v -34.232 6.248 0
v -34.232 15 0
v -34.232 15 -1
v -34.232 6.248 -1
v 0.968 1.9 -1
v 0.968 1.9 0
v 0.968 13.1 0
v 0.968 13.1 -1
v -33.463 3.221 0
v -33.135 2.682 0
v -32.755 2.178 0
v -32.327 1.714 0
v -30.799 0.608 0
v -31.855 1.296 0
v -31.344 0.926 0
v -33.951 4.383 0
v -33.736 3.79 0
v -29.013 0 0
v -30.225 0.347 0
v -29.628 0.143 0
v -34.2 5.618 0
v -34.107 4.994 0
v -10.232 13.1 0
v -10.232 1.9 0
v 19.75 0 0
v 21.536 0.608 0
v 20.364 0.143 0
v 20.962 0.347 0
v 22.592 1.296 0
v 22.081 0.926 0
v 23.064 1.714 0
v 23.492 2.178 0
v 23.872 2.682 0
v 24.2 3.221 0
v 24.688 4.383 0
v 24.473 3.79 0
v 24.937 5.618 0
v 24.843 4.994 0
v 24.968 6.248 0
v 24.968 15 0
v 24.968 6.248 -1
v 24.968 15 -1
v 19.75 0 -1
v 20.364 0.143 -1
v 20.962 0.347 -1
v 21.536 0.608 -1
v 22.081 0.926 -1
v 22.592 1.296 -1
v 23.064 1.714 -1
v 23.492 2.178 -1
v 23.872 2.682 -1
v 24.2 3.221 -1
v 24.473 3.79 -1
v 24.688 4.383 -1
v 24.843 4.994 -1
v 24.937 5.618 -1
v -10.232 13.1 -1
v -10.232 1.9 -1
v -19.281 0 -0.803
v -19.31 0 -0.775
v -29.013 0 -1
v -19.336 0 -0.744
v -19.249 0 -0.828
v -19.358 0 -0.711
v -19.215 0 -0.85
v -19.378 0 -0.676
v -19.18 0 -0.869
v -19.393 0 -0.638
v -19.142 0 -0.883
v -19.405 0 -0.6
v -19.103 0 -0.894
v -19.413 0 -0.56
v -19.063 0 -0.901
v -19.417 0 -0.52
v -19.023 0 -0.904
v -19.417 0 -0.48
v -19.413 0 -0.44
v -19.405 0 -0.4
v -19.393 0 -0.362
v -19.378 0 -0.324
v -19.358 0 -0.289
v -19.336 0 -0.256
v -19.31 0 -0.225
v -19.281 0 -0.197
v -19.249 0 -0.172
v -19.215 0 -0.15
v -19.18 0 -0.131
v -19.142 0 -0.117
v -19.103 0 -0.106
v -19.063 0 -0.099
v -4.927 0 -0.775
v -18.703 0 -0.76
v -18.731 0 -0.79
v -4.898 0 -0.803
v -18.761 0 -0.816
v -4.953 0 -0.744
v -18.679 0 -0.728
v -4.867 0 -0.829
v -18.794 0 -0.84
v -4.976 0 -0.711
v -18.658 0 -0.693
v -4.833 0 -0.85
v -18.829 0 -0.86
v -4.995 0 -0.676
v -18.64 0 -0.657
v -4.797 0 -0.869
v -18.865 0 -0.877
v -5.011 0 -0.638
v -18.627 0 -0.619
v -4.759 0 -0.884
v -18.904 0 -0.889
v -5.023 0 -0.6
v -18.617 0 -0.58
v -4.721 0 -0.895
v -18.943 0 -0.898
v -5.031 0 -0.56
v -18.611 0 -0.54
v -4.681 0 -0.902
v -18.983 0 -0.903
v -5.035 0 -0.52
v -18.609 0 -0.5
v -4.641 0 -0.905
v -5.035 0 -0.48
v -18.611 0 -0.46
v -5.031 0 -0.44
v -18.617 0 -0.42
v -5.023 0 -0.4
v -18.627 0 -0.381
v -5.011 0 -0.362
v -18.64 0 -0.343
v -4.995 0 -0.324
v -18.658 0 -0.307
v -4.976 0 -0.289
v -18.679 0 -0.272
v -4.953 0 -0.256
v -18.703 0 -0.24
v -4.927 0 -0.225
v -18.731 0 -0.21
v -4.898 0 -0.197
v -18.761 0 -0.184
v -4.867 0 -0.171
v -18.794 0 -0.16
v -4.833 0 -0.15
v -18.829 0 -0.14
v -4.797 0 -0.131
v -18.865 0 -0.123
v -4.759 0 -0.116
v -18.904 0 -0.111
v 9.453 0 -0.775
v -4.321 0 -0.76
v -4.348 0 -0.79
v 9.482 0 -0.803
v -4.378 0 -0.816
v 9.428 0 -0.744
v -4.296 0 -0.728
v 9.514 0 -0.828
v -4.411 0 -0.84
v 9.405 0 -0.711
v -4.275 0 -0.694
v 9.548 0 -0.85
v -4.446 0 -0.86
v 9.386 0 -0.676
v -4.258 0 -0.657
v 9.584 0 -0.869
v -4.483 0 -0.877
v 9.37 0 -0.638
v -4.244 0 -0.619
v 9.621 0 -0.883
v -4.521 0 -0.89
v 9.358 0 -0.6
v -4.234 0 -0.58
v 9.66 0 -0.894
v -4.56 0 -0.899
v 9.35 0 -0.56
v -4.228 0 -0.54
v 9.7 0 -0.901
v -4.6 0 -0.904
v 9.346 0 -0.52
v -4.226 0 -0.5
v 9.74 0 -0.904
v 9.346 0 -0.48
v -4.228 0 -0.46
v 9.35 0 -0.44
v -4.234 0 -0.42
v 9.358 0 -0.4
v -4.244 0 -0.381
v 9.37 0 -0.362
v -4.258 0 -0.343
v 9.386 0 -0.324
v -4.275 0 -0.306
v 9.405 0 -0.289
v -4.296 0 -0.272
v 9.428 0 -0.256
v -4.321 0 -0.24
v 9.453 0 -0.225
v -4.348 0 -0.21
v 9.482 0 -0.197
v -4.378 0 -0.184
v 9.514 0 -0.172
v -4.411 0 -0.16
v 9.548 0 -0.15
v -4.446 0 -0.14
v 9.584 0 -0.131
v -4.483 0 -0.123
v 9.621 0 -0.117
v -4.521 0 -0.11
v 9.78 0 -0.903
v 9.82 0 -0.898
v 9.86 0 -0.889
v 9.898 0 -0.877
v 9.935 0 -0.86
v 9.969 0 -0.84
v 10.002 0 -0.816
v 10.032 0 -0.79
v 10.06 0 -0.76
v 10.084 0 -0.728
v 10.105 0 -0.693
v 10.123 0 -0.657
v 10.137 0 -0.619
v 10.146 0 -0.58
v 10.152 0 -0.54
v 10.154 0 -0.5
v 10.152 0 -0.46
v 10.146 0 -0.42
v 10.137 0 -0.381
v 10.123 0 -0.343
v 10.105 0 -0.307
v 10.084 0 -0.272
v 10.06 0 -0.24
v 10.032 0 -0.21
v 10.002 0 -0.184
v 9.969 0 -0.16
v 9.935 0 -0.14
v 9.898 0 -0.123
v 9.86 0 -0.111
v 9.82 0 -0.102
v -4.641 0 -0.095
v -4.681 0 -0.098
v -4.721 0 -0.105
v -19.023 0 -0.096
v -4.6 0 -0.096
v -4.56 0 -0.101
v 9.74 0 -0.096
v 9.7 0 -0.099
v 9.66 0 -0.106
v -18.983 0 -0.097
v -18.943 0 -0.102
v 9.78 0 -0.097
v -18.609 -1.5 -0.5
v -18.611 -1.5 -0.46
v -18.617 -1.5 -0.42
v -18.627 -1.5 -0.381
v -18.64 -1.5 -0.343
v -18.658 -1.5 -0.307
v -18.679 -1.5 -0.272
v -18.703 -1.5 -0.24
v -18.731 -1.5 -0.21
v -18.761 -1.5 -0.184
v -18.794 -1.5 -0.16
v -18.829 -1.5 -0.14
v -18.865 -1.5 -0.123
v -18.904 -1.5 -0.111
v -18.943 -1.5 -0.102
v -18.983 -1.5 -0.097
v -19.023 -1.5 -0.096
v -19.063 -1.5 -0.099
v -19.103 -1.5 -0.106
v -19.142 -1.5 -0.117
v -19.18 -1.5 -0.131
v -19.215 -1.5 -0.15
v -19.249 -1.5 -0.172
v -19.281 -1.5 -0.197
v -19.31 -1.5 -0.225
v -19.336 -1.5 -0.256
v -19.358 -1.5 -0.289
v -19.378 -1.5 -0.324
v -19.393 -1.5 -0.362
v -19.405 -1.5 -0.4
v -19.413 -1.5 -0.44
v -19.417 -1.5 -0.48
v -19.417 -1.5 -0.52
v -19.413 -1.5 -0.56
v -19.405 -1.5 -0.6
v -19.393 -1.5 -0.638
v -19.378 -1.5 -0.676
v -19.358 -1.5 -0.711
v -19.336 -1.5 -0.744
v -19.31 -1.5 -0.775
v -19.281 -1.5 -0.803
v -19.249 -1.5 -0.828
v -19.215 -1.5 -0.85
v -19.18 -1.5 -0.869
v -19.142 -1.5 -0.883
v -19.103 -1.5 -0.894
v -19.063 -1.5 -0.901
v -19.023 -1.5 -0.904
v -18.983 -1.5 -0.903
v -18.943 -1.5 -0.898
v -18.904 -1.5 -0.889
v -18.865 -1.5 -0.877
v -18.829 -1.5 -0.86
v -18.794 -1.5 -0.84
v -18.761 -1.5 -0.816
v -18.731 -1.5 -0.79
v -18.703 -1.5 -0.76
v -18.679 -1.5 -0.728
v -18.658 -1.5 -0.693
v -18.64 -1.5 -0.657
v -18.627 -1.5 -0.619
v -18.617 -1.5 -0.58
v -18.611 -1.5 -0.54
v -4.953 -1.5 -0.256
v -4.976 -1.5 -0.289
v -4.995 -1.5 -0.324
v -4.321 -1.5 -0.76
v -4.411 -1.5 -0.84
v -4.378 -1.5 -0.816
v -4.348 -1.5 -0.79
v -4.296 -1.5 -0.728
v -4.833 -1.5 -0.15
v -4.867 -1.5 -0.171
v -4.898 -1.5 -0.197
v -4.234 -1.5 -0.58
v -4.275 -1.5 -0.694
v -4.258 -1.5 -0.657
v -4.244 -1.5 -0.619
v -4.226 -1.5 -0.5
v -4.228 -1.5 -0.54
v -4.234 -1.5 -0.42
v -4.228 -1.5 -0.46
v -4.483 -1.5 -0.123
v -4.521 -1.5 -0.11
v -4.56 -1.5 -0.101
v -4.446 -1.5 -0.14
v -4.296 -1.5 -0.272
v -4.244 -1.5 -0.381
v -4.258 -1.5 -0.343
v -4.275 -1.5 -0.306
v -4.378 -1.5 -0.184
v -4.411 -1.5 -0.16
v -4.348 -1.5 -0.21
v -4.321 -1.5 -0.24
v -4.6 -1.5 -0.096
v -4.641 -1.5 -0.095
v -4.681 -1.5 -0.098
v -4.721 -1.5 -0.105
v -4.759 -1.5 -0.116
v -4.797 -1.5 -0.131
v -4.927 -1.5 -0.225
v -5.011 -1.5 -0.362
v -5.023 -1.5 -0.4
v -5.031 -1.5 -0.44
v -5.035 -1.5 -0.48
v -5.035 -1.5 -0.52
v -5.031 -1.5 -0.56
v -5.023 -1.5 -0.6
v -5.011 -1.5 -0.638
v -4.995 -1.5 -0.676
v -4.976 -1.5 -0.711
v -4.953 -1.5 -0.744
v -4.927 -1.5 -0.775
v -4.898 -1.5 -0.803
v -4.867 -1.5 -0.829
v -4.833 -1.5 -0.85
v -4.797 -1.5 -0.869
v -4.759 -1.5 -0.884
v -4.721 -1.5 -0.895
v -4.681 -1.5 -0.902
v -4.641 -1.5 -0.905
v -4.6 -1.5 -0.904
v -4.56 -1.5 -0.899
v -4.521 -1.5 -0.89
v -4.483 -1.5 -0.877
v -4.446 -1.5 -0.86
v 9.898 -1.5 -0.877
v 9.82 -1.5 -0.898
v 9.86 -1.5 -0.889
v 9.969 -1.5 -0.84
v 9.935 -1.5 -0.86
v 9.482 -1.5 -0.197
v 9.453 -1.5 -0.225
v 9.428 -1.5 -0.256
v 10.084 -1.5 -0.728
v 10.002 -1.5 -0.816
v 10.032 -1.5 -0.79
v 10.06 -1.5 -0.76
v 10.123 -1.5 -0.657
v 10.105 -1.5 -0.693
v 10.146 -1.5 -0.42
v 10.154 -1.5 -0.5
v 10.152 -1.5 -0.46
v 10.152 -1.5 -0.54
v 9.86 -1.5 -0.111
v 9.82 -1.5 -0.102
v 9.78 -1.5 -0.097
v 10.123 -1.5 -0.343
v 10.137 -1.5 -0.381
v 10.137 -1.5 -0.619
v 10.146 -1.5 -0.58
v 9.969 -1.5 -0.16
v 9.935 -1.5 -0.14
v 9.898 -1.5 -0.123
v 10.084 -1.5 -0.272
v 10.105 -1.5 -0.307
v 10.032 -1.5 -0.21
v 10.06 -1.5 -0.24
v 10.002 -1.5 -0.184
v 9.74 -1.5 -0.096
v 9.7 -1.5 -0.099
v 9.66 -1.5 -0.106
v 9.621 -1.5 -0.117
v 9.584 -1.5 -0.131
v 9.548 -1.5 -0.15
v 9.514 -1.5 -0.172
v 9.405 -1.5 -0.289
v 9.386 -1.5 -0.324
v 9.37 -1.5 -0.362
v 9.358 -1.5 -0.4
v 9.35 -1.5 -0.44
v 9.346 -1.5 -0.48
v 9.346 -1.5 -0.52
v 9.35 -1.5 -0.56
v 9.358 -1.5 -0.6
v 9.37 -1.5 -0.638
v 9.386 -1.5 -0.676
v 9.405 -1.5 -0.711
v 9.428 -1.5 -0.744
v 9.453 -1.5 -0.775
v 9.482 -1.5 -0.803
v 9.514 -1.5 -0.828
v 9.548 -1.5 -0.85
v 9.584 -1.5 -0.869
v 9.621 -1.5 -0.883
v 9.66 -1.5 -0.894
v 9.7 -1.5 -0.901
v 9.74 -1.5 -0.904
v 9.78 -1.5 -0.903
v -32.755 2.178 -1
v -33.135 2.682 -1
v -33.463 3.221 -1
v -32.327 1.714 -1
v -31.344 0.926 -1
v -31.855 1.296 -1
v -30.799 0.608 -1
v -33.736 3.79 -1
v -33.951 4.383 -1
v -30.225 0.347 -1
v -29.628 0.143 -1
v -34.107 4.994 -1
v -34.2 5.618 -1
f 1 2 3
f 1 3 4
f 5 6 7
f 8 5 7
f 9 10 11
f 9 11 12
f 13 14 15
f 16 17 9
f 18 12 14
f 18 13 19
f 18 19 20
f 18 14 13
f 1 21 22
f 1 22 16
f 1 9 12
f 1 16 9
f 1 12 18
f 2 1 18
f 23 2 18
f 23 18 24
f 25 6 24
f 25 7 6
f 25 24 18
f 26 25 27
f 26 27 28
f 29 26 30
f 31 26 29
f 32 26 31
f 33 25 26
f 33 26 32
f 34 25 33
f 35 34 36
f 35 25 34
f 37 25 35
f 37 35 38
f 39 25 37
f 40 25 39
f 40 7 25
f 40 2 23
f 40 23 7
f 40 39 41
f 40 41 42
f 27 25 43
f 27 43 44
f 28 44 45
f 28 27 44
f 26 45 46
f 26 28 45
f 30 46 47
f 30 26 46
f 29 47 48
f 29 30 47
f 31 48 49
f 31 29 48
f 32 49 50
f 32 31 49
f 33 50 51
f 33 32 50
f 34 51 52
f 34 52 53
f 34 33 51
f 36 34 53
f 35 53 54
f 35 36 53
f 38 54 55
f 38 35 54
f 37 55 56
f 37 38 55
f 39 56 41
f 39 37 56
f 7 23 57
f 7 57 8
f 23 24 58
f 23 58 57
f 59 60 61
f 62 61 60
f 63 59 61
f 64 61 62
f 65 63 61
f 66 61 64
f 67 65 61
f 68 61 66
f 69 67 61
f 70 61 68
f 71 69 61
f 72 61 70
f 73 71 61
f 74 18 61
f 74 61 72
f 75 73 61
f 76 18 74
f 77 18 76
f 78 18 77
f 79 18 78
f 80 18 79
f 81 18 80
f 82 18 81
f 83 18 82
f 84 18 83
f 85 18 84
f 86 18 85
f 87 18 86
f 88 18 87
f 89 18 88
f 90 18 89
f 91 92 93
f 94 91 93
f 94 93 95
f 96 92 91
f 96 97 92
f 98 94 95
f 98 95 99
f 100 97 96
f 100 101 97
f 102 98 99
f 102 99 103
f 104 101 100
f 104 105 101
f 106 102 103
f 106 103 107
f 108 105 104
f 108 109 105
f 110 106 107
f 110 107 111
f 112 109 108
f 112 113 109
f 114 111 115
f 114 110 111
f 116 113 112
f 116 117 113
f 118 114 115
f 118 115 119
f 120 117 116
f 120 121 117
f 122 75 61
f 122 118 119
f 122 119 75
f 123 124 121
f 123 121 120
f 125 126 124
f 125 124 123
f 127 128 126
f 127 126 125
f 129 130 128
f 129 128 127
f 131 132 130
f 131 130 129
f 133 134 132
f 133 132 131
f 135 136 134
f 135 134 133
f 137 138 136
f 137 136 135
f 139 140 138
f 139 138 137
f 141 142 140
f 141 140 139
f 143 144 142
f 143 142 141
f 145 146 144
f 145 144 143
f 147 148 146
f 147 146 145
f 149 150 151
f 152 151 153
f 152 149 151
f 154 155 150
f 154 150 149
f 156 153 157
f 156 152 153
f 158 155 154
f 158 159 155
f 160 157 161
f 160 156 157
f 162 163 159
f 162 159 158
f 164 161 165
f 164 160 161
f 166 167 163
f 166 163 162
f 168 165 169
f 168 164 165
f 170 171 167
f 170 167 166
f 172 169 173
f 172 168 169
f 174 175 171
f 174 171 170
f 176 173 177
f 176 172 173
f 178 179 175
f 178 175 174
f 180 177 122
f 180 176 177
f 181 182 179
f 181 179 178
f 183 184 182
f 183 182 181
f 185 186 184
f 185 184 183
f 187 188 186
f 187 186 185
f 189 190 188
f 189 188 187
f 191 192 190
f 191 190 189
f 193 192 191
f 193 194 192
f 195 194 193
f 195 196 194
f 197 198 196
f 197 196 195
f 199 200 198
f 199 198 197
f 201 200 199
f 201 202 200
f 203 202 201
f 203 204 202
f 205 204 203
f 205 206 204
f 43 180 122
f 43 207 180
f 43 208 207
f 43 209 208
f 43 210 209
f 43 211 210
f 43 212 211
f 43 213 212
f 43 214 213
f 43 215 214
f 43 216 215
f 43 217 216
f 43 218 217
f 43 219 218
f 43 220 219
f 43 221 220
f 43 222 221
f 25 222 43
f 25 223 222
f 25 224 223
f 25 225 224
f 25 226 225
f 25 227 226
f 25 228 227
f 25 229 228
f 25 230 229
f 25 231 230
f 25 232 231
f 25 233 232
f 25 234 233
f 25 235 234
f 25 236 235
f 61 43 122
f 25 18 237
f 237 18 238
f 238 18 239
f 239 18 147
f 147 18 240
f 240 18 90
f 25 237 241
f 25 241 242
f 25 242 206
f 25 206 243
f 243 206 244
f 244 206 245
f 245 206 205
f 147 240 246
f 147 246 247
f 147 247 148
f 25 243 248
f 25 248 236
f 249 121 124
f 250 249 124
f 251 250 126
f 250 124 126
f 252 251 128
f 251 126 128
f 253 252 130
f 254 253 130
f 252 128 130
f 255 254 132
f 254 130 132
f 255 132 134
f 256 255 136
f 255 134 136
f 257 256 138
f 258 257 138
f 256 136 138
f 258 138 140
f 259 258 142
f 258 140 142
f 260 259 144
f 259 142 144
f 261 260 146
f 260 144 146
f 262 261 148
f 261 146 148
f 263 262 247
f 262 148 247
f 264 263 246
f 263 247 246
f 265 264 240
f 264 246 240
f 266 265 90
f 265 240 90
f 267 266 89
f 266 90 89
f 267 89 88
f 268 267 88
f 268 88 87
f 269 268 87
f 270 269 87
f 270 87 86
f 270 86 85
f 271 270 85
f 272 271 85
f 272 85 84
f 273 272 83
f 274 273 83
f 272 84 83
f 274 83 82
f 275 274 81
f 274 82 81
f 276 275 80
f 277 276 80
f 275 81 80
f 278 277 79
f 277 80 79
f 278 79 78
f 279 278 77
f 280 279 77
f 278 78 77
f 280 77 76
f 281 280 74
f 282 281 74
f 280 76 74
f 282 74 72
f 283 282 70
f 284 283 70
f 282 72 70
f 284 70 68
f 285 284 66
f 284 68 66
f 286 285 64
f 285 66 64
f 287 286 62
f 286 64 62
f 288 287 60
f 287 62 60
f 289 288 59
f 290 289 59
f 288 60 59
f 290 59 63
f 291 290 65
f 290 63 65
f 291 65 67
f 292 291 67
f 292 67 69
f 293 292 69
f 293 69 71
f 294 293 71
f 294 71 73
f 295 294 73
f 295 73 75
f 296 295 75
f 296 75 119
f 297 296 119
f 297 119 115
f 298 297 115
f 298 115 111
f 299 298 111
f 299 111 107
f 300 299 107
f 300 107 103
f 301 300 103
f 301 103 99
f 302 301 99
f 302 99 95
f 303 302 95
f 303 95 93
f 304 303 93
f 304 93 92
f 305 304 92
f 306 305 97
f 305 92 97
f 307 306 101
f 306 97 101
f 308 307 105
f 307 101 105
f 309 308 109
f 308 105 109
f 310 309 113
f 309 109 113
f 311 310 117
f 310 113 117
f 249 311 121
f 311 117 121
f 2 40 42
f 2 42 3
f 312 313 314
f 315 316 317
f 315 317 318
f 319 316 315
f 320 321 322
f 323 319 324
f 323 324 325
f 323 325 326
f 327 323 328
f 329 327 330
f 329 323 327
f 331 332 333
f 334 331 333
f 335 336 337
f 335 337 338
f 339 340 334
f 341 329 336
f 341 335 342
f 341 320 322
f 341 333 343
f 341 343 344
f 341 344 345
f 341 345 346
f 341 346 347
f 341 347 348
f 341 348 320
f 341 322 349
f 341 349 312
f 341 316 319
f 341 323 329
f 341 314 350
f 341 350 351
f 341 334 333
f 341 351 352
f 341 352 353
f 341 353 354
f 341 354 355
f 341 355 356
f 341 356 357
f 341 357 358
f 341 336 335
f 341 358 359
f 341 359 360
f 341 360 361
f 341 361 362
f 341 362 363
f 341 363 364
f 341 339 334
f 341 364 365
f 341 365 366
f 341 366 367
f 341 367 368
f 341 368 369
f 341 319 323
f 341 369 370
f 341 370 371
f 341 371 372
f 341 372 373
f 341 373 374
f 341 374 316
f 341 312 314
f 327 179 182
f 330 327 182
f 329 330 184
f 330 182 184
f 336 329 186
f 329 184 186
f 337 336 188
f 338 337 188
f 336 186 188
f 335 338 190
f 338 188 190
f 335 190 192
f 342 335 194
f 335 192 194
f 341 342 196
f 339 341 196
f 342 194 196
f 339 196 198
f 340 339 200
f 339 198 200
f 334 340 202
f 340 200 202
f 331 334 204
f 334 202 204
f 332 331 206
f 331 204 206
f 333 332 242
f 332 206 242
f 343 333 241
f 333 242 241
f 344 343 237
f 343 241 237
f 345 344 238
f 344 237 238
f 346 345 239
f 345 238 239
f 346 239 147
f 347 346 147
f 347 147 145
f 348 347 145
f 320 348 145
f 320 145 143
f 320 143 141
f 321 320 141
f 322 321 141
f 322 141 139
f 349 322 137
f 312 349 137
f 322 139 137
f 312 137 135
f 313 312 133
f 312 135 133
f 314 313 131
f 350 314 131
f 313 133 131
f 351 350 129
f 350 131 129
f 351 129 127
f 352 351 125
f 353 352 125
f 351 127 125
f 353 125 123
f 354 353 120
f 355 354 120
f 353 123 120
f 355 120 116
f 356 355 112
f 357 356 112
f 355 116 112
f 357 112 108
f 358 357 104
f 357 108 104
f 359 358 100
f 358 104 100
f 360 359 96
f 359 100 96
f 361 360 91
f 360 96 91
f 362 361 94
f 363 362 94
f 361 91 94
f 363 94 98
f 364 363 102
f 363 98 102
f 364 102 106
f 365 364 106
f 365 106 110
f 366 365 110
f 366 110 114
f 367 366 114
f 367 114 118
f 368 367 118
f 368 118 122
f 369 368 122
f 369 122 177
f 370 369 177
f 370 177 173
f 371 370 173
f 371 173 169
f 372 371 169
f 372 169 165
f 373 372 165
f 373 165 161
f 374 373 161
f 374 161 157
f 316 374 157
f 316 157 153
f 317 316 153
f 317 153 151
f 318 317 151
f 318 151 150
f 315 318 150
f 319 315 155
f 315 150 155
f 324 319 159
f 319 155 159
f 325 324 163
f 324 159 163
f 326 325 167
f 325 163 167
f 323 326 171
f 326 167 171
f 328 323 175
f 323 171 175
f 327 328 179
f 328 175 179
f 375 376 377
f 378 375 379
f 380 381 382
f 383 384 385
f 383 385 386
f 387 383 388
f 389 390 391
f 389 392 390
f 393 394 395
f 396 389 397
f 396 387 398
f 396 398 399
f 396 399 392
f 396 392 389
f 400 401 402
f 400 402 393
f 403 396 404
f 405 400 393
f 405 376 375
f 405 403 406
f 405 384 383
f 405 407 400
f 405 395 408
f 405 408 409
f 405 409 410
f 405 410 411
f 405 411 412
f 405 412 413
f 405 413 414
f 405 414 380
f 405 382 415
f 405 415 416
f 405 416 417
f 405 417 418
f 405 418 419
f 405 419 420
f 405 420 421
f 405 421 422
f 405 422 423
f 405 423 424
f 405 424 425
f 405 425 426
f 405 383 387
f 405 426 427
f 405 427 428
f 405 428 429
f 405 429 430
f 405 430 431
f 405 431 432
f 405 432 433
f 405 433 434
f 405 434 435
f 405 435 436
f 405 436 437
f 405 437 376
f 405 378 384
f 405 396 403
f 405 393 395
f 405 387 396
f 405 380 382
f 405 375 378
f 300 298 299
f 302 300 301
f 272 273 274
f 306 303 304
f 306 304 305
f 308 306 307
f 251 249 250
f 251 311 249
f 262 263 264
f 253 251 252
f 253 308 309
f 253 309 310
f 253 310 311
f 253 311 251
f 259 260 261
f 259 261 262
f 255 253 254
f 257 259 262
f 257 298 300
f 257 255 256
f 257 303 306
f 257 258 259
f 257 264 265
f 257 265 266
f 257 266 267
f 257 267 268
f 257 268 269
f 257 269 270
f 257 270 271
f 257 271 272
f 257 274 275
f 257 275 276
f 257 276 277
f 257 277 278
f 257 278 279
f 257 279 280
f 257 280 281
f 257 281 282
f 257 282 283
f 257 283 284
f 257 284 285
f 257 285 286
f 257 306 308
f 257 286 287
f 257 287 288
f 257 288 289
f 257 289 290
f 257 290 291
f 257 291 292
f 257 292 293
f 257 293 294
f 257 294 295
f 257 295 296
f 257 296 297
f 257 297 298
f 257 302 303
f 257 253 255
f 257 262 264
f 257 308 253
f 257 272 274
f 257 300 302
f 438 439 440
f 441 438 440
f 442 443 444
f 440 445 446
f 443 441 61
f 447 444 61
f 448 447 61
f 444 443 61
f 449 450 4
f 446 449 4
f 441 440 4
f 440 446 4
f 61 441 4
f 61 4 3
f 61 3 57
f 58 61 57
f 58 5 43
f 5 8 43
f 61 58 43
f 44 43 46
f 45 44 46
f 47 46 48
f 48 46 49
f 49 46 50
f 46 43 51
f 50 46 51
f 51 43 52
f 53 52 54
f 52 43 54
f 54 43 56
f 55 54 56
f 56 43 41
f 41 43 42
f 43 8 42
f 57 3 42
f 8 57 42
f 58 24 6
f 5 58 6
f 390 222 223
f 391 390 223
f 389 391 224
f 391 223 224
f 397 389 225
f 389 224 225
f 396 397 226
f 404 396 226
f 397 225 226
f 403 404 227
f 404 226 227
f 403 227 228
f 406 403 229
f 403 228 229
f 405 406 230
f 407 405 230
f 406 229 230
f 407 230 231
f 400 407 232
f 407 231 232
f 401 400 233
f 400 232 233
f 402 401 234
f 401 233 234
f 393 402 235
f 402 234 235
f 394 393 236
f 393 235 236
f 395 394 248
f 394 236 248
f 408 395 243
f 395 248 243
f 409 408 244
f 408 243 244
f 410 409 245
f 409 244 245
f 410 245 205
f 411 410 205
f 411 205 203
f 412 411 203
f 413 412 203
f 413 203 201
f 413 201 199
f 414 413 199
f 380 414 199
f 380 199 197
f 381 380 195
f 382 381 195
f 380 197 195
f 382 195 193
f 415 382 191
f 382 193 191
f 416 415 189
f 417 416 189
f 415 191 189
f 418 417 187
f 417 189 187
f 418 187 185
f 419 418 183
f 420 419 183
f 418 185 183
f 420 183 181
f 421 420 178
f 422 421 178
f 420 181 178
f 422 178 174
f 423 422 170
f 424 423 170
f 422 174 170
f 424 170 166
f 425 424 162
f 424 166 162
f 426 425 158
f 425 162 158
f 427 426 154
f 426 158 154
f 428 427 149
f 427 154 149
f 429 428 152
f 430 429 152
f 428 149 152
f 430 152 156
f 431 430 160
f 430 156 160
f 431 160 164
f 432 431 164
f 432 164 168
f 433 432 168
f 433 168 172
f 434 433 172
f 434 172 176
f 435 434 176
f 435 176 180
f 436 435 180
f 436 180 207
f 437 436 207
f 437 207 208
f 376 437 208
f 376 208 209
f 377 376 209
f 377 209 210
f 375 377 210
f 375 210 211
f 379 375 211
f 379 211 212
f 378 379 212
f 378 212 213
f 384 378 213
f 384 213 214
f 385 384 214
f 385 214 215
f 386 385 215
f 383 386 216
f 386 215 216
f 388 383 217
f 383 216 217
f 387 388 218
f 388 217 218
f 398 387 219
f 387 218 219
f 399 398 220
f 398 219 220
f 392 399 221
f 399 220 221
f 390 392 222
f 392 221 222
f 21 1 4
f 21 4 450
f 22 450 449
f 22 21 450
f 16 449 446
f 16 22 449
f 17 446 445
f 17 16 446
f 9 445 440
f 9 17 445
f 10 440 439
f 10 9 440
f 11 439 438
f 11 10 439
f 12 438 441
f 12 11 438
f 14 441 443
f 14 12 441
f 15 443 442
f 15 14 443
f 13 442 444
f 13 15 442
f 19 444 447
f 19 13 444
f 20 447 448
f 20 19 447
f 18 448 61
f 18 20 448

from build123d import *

# Parameters (mm, degrees)
F1_DEPTH = 1
F3_R     = 0.4045
F3_R_2   = 0.404712
F4_DEPTH = 1.5
F5_W     = 11.2
F5_H     = 11.2
F6_DEPTH = 1


with BuildPart() as f1:
    # F0 (on Top) → F1 (new body)
    with BuildSketch(Plane.XY):
        with BuildLine():
            ThreePointArc((-34.23158, 6.248362), (-32.755389, 2.177921), (-29.013159, 0))
            Line((-29.013159, 0), (19.749998, 0))
            ThreePointArc((19.749998, 0), (23.492228, 2.177921), (24.96842, 6.248362))
            Line((24.96842, 6.248362), (24.96842, 15))
            Line((24.96842, 15), (-34.23158, 15))
            Line((-34.23158, 15), (-34.23158, 6.248362))
        make_face()
    extrude(amount=-F1_DEPTH)

    # F3 (on face) → F4 (join)
    with BuildSketch(Plane.XZ):
        with Locations((-19.013159, -0.5)):
            Circle(F3_R)
        with Locations((-4.630594, -0.5)):
            Circle(F3_R_2)
        with Locations((9.749998, -0.5)):
            Circle(F3_R)
    extrude(amount=F4_DEPTH)

    # F5 (on face) → F6 (cut)
    with BuildSketch(Plane.XY):
        with Locations((-4.63158, 7.5)):
            Rectangle(F5_W, F5_H)
    extrude(amount=-F6_DEPTH, mode=Mode.SUBTRACT)


solid = f1.part
